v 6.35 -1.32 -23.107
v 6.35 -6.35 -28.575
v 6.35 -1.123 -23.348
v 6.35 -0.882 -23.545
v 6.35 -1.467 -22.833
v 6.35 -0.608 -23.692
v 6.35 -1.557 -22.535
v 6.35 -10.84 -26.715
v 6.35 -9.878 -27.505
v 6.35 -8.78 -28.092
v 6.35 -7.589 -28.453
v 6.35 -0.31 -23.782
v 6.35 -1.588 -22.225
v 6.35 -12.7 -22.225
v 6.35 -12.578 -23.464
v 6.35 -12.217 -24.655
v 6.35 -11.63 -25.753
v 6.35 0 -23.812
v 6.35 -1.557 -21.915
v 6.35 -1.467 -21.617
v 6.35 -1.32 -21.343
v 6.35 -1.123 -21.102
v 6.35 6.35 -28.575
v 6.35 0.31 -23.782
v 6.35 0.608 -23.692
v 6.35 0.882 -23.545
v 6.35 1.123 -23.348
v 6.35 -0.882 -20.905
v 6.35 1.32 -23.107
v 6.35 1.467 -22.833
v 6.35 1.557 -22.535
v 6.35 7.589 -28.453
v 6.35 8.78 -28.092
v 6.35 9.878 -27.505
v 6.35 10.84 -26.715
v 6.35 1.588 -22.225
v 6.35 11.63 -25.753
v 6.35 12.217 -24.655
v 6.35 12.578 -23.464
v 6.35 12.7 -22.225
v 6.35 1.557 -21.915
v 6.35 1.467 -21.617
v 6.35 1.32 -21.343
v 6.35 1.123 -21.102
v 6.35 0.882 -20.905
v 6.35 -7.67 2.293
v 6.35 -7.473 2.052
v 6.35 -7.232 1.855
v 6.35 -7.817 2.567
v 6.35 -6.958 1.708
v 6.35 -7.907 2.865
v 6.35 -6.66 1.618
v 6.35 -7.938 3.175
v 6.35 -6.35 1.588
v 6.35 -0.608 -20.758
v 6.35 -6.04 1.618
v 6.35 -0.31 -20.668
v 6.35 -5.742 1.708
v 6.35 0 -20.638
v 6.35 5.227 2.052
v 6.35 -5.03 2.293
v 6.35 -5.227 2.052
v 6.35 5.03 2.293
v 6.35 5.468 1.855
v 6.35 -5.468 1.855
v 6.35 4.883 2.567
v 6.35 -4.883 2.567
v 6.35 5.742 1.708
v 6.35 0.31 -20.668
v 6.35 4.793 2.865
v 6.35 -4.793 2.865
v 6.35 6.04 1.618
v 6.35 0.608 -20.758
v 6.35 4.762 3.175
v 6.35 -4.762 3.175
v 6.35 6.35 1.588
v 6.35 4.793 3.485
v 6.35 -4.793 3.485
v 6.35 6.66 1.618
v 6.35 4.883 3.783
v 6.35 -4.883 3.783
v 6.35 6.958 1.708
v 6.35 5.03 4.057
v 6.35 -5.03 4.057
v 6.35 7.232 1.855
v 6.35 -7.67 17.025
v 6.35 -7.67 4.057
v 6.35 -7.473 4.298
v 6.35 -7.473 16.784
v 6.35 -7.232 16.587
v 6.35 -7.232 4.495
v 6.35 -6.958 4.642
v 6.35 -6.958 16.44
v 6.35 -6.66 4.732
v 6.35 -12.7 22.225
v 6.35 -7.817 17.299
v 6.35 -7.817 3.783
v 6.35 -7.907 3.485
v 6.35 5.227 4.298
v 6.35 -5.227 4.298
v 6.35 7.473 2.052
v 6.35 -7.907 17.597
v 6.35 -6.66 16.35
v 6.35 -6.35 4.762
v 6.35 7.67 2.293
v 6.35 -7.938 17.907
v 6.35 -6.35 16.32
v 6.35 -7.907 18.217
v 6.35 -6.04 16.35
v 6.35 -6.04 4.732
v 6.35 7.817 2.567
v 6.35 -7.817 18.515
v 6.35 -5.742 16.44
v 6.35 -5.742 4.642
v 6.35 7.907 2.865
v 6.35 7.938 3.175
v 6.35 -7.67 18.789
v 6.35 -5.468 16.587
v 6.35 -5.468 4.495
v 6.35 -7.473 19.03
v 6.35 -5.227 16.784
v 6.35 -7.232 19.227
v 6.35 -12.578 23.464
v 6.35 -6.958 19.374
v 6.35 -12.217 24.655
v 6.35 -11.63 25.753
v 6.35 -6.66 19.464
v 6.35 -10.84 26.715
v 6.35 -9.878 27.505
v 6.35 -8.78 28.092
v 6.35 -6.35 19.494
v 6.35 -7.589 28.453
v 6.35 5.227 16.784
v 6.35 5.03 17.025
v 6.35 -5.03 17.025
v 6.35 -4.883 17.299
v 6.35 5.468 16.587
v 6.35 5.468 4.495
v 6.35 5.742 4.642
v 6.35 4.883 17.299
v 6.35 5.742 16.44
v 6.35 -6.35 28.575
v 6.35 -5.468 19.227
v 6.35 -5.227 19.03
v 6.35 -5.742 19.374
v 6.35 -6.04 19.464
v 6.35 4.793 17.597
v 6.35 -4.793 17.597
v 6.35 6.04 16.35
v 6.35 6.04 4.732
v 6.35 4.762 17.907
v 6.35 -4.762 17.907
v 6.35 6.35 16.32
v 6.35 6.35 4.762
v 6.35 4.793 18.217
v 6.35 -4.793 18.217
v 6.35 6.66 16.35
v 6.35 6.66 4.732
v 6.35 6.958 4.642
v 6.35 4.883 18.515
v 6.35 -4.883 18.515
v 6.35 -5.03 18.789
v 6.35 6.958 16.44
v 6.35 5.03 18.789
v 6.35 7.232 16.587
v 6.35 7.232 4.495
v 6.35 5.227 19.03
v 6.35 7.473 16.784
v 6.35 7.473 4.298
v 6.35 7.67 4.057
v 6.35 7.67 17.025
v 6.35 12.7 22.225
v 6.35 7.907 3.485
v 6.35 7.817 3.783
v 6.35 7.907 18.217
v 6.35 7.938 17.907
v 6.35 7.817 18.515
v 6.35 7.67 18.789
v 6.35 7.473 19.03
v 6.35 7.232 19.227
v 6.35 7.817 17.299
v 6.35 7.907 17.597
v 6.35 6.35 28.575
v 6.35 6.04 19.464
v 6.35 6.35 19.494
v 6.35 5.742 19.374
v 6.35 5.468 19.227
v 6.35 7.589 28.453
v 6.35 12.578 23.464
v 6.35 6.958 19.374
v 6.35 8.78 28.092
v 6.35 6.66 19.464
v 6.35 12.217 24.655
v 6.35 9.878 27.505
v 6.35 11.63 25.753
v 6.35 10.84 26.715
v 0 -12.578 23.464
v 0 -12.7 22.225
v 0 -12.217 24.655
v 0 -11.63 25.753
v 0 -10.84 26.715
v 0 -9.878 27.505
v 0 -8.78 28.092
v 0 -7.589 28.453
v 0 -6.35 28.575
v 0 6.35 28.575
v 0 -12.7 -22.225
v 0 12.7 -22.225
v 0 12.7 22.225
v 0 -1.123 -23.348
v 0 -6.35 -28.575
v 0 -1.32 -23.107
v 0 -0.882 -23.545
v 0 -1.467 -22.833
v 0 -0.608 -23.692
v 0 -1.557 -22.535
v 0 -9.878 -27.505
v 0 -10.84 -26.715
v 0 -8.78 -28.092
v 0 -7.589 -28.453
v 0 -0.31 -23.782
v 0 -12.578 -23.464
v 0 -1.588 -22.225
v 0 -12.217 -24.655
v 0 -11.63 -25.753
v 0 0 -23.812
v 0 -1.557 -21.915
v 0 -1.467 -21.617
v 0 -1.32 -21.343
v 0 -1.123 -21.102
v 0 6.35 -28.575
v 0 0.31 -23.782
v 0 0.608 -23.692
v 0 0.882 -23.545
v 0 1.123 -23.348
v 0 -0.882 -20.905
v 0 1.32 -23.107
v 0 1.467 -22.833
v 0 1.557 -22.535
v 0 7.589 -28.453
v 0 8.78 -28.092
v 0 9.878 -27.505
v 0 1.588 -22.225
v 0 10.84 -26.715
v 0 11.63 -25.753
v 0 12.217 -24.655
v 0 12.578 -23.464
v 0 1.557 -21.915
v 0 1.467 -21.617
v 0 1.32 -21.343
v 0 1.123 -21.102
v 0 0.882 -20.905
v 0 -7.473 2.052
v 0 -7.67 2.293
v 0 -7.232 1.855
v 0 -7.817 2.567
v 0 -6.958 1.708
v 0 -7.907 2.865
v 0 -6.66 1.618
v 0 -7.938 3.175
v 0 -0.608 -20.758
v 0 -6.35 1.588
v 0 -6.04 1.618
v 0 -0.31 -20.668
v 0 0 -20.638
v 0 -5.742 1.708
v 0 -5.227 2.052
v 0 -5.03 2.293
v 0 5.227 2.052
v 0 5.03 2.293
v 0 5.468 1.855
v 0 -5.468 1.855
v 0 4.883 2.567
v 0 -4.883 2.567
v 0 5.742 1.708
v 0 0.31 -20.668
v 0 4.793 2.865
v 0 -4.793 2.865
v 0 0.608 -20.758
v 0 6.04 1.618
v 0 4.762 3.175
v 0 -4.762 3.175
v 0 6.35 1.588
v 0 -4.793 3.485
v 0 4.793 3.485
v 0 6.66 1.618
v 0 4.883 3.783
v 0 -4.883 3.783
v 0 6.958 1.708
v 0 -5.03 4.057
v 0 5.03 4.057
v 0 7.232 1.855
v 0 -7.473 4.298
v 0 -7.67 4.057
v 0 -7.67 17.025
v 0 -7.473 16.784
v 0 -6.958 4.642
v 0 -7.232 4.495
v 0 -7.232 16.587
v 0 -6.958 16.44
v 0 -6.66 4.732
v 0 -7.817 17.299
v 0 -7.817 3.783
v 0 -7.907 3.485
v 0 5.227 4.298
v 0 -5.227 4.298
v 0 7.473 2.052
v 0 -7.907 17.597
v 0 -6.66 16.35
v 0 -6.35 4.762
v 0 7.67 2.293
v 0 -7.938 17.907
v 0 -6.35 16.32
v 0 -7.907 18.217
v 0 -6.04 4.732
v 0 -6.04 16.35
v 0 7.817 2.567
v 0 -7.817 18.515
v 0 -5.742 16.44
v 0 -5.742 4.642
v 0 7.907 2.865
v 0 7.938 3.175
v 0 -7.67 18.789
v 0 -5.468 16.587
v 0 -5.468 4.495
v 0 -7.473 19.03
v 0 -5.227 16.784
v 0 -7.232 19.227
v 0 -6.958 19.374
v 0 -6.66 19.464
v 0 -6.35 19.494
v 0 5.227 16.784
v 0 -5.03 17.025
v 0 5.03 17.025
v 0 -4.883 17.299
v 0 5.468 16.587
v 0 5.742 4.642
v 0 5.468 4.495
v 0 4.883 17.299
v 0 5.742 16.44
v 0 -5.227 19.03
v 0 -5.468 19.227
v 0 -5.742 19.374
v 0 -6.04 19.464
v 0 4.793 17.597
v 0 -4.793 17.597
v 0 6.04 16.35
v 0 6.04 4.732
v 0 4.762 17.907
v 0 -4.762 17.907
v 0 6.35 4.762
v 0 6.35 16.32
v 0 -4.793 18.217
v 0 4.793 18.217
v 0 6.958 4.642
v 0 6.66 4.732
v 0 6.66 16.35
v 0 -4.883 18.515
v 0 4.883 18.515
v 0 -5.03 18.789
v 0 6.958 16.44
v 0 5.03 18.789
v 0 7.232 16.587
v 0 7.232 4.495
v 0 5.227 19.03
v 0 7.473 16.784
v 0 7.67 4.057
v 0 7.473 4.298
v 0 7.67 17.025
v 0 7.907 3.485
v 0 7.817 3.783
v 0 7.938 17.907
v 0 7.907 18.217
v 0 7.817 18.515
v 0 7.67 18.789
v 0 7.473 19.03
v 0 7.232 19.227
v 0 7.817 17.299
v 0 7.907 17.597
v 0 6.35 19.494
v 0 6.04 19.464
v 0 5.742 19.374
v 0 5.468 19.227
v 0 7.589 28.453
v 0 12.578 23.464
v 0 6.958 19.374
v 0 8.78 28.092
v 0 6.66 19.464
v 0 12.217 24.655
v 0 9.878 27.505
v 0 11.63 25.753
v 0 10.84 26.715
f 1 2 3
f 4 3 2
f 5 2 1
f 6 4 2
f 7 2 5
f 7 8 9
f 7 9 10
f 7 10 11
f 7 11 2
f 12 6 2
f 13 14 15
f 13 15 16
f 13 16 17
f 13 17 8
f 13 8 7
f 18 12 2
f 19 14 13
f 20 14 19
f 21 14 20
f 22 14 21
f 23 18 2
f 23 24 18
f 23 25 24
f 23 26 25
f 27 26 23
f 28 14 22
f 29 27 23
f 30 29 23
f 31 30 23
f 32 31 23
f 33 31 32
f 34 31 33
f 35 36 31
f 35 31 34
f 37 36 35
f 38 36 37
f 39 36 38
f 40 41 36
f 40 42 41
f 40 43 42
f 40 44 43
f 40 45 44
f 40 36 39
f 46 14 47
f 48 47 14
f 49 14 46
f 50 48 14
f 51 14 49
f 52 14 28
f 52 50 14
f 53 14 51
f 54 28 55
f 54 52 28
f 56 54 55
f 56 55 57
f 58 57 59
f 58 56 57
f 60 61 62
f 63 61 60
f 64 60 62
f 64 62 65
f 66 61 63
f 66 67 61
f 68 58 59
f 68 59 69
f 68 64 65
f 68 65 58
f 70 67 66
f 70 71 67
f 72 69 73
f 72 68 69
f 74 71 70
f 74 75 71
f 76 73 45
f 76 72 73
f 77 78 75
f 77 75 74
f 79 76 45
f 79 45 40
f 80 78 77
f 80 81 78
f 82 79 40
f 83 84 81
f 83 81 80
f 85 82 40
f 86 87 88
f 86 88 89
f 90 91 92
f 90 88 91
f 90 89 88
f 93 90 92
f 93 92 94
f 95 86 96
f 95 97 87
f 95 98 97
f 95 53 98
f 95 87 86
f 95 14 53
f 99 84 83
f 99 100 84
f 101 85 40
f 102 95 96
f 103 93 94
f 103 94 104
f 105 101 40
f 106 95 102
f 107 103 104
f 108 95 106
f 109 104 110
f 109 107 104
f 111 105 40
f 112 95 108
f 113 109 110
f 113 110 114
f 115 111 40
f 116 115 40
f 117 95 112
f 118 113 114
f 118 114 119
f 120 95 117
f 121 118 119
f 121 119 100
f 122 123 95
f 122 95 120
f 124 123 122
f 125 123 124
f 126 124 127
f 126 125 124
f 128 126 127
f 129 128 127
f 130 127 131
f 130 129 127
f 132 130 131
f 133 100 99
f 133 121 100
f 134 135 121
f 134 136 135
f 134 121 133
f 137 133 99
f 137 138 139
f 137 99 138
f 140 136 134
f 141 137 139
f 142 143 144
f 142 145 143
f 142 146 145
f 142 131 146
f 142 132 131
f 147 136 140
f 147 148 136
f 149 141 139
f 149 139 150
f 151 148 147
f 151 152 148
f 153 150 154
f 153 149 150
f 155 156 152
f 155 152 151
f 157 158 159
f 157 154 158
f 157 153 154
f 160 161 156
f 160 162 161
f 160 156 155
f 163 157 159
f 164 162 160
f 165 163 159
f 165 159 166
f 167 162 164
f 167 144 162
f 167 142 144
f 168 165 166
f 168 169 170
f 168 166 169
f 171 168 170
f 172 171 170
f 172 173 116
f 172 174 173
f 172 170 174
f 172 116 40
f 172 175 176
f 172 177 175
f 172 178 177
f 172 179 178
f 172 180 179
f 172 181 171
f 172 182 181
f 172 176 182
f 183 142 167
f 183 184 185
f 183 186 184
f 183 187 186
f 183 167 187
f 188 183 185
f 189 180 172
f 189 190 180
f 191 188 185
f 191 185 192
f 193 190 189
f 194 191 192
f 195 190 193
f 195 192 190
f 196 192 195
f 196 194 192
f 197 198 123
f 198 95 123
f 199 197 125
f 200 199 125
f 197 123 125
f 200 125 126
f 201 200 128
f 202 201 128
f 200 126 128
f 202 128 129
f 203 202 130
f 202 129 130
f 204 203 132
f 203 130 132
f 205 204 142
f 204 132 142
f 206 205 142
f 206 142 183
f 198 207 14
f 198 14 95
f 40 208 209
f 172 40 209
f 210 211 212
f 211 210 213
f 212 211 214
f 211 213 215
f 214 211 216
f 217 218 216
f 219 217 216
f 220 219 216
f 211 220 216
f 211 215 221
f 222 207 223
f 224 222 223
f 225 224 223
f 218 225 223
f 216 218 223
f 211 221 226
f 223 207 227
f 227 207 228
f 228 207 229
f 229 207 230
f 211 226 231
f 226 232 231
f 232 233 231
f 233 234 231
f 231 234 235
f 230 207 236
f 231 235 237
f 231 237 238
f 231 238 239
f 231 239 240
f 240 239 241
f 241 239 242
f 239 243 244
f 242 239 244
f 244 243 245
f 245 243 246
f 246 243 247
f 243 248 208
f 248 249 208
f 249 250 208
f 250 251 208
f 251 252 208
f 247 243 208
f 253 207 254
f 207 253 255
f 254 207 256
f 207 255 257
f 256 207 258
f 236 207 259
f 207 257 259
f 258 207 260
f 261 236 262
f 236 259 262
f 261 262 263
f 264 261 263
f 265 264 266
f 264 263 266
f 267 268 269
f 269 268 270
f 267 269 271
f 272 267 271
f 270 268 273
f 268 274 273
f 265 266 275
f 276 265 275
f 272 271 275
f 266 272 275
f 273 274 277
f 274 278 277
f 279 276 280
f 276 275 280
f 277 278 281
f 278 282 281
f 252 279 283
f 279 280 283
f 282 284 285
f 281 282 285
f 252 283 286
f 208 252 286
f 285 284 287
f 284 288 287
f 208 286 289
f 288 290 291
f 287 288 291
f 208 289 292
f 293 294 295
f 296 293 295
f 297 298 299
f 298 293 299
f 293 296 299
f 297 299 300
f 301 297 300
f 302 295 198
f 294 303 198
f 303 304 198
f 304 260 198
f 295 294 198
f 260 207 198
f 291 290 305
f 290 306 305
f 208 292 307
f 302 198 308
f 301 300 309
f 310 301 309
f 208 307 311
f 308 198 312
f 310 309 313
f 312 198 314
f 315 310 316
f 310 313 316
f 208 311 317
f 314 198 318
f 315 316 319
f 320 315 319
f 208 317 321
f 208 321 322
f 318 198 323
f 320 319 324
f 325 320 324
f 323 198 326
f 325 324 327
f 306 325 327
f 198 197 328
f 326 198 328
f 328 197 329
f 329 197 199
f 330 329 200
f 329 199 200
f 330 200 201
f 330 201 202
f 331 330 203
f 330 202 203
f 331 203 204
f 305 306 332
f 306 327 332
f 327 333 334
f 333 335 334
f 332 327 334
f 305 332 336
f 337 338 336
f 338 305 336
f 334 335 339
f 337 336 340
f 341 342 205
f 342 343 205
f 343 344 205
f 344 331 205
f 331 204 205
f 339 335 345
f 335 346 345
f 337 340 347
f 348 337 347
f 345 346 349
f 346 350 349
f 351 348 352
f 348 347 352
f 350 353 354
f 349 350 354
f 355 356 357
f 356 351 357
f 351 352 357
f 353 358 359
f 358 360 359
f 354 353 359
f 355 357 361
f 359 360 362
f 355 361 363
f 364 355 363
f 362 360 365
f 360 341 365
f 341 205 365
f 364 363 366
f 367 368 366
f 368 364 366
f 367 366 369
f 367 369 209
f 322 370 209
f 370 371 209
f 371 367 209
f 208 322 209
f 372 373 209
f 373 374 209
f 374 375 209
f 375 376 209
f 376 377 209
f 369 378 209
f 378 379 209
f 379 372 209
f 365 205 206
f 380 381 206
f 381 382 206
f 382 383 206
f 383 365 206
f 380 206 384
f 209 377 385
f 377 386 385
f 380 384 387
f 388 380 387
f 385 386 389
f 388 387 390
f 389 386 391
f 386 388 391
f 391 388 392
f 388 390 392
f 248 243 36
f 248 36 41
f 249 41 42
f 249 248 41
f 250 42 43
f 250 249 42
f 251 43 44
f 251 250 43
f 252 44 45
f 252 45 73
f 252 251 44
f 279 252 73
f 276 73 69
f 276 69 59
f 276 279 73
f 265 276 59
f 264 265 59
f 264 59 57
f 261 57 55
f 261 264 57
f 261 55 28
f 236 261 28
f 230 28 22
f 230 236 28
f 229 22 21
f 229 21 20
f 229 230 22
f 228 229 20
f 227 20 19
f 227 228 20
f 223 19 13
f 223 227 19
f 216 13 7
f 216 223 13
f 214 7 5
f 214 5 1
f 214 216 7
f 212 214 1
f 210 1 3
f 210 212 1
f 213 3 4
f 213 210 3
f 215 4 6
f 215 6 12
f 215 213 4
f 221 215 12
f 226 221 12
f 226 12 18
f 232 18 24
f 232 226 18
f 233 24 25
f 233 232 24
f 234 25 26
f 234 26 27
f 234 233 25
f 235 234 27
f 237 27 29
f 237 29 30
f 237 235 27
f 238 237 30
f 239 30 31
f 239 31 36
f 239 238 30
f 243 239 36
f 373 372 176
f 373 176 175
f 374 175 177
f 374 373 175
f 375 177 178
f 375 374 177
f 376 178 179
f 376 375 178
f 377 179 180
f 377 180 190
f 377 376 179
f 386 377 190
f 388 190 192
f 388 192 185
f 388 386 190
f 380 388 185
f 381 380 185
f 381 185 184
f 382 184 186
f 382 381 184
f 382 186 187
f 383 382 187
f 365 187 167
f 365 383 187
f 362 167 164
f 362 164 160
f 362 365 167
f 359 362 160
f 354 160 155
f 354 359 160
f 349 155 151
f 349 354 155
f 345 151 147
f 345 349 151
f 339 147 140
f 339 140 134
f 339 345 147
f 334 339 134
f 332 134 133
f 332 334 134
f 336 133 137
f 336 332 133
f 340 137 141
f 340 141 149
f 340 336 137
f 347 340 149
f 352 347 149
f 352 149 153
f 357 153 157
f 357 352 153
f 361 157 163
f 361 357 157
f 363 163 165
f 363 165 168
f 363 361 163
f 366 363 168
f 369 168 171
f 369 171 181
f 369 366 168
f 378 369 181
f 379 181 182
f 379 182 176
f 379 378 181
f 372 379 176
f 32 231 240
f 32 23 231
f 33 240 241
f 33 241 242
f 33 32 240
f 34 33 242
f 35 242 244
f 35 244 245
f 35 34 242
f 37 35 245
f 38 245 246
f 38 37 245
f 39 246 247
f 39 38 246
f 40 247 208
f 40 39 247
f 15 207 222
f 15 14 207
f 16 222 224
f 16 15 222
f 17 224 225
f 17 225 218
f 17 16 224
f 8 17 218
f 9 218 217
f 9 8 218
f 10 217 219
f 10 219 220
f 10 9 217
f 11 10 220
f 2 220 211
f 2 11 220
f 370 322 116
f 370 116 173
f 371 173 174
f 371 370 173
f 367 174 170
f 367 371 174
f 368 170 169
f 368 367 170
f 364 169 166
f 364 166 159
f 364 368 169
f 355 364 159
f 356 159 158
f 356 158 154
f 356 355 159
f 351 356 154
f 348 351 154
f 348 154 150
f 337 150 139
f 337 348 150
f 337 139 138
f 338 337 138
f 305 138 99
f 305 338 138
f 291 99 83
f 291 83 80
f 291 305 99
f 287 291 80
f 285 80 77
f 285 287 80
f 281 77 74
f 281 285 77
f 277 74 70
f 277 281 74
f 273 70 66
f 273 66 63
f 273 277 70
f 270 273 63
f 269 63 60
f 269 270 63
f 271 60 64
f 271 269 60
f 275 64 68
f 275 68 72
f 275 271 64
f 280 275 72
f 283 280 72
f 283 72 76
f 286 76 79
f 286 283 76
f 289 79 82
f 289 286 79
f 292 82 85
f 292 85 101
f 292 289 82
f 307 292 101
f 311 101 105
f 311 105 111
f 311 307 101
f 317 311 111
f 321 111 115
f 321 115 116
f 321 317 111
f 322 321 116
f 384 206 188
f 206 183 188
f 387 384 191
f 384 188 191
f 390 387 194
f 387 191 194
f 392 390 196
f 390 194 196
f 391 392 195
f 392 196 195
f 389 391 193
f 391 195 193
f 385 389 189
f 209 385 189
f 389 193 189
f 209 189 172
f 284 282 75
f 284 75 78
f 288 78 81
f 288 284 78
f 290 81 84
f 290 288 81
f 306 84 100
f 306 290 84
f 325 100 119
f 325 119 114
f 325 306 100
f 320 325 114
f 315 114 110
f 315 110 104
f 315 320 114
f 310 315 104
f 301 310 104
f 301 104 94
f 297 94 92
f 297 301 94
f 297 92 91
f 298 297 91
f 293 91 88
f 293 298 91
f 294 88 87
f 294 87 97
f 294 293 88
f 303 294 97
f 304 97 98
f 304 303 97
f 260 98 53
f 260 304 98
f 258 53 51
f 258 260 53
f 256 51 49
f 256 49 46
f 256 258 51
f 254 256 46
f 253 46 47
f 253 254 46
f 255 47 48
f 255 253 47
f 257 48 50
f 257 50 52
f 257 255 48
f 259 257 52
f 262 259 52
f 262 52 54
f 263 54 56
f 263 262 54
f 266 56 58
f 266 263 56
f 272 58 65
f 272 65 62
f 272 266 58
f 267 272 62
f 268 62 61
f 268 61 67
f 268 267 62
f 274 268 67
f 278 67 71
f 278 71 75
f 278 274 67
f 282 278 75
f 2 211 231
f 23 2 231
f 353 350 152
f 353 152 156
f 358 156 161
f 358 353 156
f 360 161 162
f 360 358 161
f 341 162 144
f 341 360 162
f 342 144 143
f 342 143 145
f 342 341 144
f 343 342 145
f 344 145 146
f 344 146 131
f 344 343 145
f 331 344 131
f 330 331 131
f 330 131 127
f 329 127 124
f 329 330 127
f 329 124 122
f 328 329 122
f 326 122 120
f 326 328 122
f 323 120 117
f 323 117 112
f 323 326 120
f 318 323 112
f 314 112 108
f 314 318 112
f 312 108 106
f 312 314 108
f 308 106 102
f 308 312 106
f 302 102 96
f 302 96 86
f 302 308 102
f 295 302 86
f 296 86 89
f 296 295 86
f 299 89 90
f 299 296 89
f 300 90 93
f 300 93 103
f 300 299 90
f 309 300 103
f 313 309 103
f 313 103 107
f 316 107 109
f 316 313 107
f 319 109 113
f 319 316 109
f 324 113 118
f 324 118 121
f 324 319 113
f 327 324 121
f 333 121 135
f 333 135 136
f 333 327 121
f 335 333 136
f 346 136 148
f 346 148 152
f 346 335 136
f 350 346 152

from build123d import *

# Parameters (mm, degrees)
F0_W     = 25.4
F0_H     = 57.15
F0_R     = 1.5875
F1_DEPTH = 6.35
F2_R     = 6.35
F3_R     = 6.35


with BuildPart() as f1:
    # F0 (on Right) → F1 (new body)
    with BuildSketch(Plane.YZ):
        Rectangle(F0_W, F0_H)
        with Locations((0, -22.225)):
            Circle(F0_R, mode=Mode.SUBTRACT)
        with Locations((-6.35, 3.175)):
            Circle(F0_R, mode=Mode.SUBTRACT)
        with Locations((-6.35, 17.907)):
            Circle(F0_R, mode=Mode.SUBTRACT)
        with Locations((6.35, 3.175)):
            Circle(F0_R, mode=Mode.SUBTRACT)
        with Locations((6.35, 17.907)):
            Circle(F0_R, mode=Mode.SUBTRACT)
    extrude(amount=F1_DEPTH)

    # F2
    f2_edges = [f1.edges().sort_by_distance(p)[0] for p in [
        (3.175, -12.7, 28.575),
        (3.175, 12.7, 28.575),
    ]]
    fillet(f2_edges, radius=F2_R)

    # F3
    f3_edges = [f1.edges().sort_by_distance(p)[0] for p in [
        (3.175, -12.7, -28.575),
        (3.175, 12.7, -28.575),
    ]]
    fillet(f3_edges, radius=F3_R)


solid = f1.part
